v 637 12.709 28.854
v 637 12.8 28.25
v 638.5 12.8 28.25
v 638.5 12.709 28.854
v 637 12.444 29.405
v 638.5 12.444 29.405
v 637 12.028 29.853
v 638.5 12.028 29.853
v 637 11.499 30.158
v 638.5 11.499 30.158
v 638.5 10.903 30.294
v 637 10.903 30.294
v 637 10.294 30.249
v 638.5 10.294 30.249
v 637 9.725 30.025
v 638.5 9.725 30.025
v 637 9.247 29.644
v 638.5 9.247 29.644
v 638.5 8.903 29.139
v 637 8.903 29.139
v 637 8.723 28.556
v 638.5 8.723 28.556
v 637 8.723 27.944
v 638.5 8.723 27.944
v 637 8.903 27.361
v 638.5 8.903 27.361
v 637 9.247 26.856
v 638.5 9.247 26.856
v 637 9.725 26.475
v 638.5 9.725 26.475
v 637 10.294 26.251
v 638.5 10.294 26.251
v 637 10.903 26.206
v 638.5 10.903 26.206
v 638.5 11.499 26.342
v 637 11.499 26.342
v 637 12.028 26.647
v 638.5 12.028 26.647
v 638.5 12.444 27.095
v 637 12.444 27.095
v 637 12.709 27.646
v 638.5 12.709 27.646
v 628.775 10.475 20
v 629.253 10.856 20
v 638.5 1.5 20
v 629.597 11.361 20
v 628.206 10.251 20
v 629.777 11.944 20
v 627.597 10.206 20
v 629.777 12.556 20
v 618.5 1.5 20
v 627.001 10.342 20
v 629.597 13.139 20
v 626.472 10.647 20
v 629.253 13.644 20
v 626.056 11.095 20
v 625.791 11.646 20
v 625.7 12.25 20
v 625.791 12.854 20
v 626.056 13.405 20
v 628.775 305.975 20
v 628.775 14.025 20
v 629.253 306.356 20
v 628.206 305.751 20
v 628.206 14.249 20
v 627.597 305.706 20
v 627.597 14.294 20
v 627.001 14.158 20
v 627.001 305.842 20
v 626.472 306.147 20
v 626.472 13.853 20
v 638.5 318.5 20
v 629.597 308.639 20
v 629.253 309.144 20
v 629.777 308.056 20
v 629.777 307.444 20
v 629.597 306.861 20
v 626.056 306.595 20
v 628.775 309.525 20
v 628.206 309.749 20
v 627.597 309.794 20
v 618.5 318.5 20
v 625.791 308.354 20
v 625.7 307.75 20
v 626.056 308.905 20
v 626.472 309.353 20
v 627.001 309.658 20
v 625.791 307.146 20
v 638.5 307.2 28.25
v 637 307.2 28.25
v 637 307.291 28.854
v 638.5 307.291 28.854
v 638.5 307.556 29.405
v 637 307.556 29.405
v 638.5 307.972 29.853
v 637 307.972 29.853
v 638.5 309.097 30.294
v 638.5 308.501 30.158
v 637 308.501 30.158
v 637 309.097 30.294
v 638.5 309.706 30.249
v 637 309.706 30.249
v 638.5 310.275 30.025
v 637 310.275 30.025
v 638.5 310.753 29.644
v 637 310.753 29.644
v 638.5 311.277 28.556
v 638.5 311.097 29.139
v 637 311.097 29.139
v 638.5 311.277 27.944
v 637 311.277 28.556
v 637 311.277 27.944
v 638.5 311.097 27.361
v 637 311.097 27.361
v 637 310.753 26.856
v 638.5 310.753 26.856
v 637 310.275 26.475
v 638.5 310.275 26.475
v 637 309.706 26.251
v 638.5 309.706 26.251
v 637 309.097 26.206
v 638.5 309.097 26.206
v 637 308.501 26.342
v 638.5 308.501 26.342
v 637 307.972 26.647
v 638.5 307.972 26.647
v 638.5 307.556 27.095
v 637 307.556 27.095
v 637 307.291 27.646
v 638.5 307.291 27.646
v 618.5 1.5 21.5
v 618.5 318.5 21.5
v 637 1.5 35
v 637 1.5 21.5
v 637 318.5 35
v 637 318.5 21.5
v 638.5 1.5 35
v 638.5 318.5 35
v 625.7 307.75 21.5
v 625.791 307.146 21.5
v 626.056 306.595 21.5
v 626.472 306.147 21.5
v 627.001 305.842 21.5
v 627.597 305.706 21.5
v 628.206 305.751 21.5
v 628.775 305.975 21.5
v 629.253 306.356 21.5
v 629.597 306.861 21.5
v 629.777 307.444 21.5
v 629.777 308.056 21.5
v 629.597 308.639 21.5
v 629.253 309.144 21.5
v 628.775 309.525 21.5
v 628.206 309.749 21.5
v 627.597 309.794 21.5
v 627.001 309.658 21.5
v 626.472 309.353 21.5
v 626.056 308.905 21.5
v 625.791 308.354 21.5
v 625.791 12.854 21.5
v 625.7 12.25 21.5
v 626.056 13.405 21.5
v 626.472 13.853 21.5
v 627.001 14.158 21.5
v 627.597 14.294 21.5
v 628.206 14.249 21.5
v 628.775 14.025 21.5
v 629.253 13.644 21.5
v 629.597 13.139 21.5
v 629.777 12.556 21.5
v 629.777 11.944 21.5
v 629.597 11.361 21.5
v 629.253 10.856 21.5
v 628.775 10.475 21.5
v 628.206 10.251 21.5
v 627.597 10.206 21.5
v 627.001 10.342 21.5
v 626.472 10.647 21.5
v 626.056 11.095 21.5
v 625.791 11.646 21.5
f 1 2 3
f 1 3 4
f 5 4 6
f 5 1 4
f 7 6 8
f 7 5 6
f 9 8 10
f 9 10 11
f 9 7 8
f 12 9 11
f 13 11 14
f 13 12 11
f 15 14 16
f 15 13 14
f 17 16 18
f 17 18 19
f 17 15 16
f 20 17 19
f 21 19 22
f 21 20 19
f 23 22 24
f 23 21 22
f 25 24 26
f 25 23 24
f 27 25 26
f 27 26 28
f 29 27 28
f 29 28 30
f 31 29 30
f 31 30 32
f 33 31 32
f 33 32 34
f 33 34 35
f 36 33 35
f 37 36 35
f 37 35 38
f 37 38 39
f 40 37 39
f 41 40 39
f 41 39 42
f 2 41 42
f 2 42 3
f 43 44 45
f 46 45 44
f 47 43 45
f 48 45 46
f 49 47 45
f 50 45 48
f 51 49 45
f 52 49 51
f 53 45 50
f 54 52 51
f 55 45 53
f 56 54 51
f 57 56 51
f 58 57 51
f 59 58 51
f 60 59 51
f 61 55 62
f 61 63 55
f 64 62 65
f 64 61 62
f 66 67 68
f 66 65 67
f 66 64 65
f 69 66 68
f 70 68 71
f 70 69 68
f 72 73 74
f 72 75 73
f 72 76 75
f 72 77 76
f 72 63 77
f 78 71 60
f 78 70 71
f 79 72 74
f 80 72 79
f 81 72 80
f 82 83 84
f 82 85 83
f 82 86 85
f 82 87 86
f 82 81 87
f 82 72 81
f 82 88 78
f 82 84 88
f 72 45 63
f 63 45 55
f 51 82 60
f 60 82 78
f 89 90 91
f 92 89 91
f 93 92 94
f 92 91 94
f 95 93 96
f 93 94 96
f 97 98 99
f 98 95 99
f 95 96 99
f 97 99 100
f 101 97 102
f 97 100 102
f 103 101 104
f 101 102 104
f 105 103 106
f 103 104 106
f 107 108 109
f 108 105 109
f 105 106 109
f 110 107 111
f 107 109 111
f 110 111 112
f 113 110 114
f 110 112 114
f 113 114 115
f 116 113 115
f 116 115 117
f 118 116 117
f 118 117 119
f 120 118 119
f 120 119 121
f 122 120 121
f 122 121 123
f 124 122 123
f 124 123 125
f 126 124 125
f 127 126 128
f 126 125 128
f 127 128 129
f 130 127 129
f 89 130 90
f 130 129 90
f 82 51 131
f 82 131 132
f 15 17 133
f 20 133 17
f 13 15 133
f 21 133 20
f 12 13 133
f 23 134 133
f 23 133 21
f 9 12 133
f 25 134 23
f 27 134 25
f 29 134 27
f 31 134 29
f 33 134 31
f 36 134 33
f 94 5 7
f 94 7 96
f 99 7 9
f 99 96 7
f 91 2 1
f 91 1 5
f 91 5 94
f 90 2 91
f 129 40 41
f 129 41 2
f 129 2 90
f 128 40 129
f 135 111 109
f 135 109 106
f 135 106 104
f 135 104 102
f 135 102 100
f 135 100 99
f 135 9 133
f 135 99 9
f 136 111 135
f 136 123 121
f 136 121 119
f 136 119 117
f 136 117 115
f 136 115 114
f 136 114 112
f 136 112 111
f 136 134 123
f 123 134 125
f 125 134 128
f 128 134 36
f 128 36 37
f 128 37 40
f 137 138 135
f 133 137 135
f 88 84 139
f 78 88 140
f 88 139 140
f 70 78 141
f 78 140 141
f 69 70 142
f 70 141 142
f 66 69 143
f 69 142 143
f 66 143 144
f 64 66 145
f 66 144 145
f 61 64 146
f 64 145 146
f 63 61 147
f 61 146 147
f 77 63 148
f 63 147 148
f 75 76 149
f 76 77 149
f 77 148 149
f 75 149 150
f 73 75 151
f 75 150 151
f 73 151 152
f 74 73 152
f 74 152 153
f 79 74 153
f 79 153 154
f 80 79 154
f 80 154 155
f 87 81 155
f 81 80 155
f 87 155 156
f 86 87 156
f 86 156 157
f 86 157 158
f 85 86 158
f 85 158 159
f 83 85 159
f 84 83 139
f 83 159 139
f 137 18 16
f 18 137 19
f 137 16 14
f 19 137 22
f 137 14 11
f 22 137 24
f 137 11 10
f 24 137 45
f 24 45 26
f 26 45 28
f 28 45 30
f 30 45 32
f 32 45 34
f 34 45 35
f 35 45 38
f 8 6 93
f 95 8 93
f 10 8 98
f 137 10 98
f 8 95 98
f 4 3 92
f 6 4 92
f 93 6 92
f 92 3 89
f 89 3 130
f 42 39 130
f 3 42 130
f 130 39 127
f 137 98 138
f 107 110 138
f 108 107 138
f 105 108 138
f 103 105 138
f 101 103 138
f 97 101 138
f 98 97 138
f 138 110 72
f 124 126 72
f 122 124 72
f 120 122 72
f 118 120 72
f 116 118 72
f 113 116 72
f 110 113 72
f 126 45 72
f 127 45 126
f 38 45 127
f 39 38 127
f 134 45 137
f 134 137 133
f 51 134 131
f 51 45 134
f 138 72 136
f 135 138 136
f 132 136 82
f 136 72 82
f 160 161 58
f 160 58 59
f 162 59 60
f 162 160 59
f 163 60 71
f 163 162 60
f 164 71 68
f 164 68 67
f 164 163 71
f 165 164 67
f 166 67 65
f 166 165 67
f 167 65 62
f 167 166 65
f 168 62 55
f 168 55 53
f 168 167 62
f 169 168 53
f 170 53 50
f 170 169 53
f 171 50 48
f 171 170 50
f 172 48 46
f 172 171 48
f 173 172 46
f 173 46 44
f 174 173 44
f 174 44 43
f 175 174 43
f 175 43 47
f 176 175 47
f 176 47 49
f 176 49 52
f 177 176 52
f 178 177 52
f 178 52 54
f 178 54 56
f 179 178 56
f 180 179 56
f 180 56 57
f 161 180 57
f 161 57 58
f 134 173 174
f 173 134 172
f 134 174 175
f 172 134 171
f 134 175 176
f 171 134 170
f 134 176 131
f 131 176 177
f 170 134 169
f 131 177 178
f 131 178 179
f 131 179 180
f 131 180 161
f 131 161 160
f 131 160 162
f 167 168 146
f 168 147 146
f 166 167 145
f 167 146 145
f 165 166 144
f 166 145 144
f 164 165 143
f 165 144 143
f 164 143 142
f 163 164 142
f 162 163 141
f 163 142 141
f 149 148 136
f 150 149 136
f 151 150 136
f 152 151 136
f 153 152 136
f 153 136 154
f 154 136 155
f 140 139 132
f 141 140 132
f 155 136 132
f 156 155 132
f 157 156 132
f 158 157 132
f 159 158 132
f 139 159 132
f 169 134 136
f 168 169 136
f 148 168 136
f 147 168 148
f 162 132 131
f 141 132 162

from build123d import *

# Parameters (mm, degrees)
BOX005_W      = 20
BOX005_H      = 317
BOX005_DEPTH  = 13.5
BOX004_W      = 20
BOX004_H      = 317
BOX004_DEPTH  = 15
SKETCH006_R   = 2.05
HOLE001_DEPTH = 638.969553
SKETCH008_R   = 2.05
HOLE003_DEPTH = 637.469553


with BuildPart() as cut016:
    # Box005 → Box005 (new body)
    with BuildSketch(Plane(origin=(1.5, 0, 1.5), x_dir=(1, 0, 0), z_dir=(0, 0, 1))):
        with Locations((10, 158.5)):
            Rectangle(BOX005_W, BOX005_H)
    extrude(amount=BOX005_DEPTH)


with BuildPart() as side_bottom_body:
    # Box004 → Box004 (new body)
    with BuildSketch(Plane.XY):
        with Locations((10, 158.5)):
            Rectangle(BOX004_W, BOX004_H)
    extrude(amount=BOX004_DEPTH)

    # Cut002: cut Cut016
    add(cut016.part, mode=Mode.SUBTRACT)


with BuildPart() as side_bottom_body_1:
    # Cut002 placement: moved
    add(side_bottom_body.part.moved(Location((1.5, 1.5, 21.5))))


with BuildPart() as side_bottom_body_2:
    # BaseFeature001 placement: moved
    add(side_bottom_body_1.part.moved(Location((-1.5, -1.5, -21.5))))

    # Sketch006 → Hole001 (cut, through all)
    with BuildSketch(Plane.YZ.offset(3)):
        with Locations((9.25, 8.25)):
            Circle(SKETCH006_R)
    hole001 = extrude(amount=-HOLE001_DEPTH, mode=Mode.SUBTRACT)

    # Mirrored: Hole001 across Sketch006 Axis0
    add(hole001.mirror(Plane(origin=(3, 158.5, 15), x_dir=(1, 0, 0), z_dir=(0, 1, 0))), mode=Mode.SUBTRACT)

    # Sketch008 → Hole003 (cut, through all)
    with BuildSketch(Plane.XY.offset(1.5)):
        with Locations((10.75, 10.75)):
            Circle(SKETCH008_R)
    hole003 = extrude(amount=-HOLE003_DEPTH, mode=Mode.SUBTRACT)

    # Mirrored001: Hole003 across Sketch008 Axis0
    add(hole003.mirror(Plane(origin=(20, 158.5, 1.5), x_dir=(0, 0, 1), z_dir=(0, -1, 0))), mode=Mode.SUBTRACT)


with BuildPart() as side_bottom_body_3:
    # Body001 placement: moved
    add(side_bottom_body_2.part.moved(Location((1.5, 1.5, 20))))


with BuildPart() as left_bottom_mirror:
    # Part__Mirroring001: instance of side_bottom_body
    add(side_bottom_body_3.part.mirror(Plane(origin=(2e-06, 160, 27.5), x_dir=(0, -1, 0), z_dir=(1, 0, 0))))


with BuildPart() as left_bottom_mirror_1:
    # Part__Mirroring001 placement: moved
    add(left_bottom_mirror.part.moved(Location((640, 0, 0))))


solid = left_bottom_mirror_1.part
